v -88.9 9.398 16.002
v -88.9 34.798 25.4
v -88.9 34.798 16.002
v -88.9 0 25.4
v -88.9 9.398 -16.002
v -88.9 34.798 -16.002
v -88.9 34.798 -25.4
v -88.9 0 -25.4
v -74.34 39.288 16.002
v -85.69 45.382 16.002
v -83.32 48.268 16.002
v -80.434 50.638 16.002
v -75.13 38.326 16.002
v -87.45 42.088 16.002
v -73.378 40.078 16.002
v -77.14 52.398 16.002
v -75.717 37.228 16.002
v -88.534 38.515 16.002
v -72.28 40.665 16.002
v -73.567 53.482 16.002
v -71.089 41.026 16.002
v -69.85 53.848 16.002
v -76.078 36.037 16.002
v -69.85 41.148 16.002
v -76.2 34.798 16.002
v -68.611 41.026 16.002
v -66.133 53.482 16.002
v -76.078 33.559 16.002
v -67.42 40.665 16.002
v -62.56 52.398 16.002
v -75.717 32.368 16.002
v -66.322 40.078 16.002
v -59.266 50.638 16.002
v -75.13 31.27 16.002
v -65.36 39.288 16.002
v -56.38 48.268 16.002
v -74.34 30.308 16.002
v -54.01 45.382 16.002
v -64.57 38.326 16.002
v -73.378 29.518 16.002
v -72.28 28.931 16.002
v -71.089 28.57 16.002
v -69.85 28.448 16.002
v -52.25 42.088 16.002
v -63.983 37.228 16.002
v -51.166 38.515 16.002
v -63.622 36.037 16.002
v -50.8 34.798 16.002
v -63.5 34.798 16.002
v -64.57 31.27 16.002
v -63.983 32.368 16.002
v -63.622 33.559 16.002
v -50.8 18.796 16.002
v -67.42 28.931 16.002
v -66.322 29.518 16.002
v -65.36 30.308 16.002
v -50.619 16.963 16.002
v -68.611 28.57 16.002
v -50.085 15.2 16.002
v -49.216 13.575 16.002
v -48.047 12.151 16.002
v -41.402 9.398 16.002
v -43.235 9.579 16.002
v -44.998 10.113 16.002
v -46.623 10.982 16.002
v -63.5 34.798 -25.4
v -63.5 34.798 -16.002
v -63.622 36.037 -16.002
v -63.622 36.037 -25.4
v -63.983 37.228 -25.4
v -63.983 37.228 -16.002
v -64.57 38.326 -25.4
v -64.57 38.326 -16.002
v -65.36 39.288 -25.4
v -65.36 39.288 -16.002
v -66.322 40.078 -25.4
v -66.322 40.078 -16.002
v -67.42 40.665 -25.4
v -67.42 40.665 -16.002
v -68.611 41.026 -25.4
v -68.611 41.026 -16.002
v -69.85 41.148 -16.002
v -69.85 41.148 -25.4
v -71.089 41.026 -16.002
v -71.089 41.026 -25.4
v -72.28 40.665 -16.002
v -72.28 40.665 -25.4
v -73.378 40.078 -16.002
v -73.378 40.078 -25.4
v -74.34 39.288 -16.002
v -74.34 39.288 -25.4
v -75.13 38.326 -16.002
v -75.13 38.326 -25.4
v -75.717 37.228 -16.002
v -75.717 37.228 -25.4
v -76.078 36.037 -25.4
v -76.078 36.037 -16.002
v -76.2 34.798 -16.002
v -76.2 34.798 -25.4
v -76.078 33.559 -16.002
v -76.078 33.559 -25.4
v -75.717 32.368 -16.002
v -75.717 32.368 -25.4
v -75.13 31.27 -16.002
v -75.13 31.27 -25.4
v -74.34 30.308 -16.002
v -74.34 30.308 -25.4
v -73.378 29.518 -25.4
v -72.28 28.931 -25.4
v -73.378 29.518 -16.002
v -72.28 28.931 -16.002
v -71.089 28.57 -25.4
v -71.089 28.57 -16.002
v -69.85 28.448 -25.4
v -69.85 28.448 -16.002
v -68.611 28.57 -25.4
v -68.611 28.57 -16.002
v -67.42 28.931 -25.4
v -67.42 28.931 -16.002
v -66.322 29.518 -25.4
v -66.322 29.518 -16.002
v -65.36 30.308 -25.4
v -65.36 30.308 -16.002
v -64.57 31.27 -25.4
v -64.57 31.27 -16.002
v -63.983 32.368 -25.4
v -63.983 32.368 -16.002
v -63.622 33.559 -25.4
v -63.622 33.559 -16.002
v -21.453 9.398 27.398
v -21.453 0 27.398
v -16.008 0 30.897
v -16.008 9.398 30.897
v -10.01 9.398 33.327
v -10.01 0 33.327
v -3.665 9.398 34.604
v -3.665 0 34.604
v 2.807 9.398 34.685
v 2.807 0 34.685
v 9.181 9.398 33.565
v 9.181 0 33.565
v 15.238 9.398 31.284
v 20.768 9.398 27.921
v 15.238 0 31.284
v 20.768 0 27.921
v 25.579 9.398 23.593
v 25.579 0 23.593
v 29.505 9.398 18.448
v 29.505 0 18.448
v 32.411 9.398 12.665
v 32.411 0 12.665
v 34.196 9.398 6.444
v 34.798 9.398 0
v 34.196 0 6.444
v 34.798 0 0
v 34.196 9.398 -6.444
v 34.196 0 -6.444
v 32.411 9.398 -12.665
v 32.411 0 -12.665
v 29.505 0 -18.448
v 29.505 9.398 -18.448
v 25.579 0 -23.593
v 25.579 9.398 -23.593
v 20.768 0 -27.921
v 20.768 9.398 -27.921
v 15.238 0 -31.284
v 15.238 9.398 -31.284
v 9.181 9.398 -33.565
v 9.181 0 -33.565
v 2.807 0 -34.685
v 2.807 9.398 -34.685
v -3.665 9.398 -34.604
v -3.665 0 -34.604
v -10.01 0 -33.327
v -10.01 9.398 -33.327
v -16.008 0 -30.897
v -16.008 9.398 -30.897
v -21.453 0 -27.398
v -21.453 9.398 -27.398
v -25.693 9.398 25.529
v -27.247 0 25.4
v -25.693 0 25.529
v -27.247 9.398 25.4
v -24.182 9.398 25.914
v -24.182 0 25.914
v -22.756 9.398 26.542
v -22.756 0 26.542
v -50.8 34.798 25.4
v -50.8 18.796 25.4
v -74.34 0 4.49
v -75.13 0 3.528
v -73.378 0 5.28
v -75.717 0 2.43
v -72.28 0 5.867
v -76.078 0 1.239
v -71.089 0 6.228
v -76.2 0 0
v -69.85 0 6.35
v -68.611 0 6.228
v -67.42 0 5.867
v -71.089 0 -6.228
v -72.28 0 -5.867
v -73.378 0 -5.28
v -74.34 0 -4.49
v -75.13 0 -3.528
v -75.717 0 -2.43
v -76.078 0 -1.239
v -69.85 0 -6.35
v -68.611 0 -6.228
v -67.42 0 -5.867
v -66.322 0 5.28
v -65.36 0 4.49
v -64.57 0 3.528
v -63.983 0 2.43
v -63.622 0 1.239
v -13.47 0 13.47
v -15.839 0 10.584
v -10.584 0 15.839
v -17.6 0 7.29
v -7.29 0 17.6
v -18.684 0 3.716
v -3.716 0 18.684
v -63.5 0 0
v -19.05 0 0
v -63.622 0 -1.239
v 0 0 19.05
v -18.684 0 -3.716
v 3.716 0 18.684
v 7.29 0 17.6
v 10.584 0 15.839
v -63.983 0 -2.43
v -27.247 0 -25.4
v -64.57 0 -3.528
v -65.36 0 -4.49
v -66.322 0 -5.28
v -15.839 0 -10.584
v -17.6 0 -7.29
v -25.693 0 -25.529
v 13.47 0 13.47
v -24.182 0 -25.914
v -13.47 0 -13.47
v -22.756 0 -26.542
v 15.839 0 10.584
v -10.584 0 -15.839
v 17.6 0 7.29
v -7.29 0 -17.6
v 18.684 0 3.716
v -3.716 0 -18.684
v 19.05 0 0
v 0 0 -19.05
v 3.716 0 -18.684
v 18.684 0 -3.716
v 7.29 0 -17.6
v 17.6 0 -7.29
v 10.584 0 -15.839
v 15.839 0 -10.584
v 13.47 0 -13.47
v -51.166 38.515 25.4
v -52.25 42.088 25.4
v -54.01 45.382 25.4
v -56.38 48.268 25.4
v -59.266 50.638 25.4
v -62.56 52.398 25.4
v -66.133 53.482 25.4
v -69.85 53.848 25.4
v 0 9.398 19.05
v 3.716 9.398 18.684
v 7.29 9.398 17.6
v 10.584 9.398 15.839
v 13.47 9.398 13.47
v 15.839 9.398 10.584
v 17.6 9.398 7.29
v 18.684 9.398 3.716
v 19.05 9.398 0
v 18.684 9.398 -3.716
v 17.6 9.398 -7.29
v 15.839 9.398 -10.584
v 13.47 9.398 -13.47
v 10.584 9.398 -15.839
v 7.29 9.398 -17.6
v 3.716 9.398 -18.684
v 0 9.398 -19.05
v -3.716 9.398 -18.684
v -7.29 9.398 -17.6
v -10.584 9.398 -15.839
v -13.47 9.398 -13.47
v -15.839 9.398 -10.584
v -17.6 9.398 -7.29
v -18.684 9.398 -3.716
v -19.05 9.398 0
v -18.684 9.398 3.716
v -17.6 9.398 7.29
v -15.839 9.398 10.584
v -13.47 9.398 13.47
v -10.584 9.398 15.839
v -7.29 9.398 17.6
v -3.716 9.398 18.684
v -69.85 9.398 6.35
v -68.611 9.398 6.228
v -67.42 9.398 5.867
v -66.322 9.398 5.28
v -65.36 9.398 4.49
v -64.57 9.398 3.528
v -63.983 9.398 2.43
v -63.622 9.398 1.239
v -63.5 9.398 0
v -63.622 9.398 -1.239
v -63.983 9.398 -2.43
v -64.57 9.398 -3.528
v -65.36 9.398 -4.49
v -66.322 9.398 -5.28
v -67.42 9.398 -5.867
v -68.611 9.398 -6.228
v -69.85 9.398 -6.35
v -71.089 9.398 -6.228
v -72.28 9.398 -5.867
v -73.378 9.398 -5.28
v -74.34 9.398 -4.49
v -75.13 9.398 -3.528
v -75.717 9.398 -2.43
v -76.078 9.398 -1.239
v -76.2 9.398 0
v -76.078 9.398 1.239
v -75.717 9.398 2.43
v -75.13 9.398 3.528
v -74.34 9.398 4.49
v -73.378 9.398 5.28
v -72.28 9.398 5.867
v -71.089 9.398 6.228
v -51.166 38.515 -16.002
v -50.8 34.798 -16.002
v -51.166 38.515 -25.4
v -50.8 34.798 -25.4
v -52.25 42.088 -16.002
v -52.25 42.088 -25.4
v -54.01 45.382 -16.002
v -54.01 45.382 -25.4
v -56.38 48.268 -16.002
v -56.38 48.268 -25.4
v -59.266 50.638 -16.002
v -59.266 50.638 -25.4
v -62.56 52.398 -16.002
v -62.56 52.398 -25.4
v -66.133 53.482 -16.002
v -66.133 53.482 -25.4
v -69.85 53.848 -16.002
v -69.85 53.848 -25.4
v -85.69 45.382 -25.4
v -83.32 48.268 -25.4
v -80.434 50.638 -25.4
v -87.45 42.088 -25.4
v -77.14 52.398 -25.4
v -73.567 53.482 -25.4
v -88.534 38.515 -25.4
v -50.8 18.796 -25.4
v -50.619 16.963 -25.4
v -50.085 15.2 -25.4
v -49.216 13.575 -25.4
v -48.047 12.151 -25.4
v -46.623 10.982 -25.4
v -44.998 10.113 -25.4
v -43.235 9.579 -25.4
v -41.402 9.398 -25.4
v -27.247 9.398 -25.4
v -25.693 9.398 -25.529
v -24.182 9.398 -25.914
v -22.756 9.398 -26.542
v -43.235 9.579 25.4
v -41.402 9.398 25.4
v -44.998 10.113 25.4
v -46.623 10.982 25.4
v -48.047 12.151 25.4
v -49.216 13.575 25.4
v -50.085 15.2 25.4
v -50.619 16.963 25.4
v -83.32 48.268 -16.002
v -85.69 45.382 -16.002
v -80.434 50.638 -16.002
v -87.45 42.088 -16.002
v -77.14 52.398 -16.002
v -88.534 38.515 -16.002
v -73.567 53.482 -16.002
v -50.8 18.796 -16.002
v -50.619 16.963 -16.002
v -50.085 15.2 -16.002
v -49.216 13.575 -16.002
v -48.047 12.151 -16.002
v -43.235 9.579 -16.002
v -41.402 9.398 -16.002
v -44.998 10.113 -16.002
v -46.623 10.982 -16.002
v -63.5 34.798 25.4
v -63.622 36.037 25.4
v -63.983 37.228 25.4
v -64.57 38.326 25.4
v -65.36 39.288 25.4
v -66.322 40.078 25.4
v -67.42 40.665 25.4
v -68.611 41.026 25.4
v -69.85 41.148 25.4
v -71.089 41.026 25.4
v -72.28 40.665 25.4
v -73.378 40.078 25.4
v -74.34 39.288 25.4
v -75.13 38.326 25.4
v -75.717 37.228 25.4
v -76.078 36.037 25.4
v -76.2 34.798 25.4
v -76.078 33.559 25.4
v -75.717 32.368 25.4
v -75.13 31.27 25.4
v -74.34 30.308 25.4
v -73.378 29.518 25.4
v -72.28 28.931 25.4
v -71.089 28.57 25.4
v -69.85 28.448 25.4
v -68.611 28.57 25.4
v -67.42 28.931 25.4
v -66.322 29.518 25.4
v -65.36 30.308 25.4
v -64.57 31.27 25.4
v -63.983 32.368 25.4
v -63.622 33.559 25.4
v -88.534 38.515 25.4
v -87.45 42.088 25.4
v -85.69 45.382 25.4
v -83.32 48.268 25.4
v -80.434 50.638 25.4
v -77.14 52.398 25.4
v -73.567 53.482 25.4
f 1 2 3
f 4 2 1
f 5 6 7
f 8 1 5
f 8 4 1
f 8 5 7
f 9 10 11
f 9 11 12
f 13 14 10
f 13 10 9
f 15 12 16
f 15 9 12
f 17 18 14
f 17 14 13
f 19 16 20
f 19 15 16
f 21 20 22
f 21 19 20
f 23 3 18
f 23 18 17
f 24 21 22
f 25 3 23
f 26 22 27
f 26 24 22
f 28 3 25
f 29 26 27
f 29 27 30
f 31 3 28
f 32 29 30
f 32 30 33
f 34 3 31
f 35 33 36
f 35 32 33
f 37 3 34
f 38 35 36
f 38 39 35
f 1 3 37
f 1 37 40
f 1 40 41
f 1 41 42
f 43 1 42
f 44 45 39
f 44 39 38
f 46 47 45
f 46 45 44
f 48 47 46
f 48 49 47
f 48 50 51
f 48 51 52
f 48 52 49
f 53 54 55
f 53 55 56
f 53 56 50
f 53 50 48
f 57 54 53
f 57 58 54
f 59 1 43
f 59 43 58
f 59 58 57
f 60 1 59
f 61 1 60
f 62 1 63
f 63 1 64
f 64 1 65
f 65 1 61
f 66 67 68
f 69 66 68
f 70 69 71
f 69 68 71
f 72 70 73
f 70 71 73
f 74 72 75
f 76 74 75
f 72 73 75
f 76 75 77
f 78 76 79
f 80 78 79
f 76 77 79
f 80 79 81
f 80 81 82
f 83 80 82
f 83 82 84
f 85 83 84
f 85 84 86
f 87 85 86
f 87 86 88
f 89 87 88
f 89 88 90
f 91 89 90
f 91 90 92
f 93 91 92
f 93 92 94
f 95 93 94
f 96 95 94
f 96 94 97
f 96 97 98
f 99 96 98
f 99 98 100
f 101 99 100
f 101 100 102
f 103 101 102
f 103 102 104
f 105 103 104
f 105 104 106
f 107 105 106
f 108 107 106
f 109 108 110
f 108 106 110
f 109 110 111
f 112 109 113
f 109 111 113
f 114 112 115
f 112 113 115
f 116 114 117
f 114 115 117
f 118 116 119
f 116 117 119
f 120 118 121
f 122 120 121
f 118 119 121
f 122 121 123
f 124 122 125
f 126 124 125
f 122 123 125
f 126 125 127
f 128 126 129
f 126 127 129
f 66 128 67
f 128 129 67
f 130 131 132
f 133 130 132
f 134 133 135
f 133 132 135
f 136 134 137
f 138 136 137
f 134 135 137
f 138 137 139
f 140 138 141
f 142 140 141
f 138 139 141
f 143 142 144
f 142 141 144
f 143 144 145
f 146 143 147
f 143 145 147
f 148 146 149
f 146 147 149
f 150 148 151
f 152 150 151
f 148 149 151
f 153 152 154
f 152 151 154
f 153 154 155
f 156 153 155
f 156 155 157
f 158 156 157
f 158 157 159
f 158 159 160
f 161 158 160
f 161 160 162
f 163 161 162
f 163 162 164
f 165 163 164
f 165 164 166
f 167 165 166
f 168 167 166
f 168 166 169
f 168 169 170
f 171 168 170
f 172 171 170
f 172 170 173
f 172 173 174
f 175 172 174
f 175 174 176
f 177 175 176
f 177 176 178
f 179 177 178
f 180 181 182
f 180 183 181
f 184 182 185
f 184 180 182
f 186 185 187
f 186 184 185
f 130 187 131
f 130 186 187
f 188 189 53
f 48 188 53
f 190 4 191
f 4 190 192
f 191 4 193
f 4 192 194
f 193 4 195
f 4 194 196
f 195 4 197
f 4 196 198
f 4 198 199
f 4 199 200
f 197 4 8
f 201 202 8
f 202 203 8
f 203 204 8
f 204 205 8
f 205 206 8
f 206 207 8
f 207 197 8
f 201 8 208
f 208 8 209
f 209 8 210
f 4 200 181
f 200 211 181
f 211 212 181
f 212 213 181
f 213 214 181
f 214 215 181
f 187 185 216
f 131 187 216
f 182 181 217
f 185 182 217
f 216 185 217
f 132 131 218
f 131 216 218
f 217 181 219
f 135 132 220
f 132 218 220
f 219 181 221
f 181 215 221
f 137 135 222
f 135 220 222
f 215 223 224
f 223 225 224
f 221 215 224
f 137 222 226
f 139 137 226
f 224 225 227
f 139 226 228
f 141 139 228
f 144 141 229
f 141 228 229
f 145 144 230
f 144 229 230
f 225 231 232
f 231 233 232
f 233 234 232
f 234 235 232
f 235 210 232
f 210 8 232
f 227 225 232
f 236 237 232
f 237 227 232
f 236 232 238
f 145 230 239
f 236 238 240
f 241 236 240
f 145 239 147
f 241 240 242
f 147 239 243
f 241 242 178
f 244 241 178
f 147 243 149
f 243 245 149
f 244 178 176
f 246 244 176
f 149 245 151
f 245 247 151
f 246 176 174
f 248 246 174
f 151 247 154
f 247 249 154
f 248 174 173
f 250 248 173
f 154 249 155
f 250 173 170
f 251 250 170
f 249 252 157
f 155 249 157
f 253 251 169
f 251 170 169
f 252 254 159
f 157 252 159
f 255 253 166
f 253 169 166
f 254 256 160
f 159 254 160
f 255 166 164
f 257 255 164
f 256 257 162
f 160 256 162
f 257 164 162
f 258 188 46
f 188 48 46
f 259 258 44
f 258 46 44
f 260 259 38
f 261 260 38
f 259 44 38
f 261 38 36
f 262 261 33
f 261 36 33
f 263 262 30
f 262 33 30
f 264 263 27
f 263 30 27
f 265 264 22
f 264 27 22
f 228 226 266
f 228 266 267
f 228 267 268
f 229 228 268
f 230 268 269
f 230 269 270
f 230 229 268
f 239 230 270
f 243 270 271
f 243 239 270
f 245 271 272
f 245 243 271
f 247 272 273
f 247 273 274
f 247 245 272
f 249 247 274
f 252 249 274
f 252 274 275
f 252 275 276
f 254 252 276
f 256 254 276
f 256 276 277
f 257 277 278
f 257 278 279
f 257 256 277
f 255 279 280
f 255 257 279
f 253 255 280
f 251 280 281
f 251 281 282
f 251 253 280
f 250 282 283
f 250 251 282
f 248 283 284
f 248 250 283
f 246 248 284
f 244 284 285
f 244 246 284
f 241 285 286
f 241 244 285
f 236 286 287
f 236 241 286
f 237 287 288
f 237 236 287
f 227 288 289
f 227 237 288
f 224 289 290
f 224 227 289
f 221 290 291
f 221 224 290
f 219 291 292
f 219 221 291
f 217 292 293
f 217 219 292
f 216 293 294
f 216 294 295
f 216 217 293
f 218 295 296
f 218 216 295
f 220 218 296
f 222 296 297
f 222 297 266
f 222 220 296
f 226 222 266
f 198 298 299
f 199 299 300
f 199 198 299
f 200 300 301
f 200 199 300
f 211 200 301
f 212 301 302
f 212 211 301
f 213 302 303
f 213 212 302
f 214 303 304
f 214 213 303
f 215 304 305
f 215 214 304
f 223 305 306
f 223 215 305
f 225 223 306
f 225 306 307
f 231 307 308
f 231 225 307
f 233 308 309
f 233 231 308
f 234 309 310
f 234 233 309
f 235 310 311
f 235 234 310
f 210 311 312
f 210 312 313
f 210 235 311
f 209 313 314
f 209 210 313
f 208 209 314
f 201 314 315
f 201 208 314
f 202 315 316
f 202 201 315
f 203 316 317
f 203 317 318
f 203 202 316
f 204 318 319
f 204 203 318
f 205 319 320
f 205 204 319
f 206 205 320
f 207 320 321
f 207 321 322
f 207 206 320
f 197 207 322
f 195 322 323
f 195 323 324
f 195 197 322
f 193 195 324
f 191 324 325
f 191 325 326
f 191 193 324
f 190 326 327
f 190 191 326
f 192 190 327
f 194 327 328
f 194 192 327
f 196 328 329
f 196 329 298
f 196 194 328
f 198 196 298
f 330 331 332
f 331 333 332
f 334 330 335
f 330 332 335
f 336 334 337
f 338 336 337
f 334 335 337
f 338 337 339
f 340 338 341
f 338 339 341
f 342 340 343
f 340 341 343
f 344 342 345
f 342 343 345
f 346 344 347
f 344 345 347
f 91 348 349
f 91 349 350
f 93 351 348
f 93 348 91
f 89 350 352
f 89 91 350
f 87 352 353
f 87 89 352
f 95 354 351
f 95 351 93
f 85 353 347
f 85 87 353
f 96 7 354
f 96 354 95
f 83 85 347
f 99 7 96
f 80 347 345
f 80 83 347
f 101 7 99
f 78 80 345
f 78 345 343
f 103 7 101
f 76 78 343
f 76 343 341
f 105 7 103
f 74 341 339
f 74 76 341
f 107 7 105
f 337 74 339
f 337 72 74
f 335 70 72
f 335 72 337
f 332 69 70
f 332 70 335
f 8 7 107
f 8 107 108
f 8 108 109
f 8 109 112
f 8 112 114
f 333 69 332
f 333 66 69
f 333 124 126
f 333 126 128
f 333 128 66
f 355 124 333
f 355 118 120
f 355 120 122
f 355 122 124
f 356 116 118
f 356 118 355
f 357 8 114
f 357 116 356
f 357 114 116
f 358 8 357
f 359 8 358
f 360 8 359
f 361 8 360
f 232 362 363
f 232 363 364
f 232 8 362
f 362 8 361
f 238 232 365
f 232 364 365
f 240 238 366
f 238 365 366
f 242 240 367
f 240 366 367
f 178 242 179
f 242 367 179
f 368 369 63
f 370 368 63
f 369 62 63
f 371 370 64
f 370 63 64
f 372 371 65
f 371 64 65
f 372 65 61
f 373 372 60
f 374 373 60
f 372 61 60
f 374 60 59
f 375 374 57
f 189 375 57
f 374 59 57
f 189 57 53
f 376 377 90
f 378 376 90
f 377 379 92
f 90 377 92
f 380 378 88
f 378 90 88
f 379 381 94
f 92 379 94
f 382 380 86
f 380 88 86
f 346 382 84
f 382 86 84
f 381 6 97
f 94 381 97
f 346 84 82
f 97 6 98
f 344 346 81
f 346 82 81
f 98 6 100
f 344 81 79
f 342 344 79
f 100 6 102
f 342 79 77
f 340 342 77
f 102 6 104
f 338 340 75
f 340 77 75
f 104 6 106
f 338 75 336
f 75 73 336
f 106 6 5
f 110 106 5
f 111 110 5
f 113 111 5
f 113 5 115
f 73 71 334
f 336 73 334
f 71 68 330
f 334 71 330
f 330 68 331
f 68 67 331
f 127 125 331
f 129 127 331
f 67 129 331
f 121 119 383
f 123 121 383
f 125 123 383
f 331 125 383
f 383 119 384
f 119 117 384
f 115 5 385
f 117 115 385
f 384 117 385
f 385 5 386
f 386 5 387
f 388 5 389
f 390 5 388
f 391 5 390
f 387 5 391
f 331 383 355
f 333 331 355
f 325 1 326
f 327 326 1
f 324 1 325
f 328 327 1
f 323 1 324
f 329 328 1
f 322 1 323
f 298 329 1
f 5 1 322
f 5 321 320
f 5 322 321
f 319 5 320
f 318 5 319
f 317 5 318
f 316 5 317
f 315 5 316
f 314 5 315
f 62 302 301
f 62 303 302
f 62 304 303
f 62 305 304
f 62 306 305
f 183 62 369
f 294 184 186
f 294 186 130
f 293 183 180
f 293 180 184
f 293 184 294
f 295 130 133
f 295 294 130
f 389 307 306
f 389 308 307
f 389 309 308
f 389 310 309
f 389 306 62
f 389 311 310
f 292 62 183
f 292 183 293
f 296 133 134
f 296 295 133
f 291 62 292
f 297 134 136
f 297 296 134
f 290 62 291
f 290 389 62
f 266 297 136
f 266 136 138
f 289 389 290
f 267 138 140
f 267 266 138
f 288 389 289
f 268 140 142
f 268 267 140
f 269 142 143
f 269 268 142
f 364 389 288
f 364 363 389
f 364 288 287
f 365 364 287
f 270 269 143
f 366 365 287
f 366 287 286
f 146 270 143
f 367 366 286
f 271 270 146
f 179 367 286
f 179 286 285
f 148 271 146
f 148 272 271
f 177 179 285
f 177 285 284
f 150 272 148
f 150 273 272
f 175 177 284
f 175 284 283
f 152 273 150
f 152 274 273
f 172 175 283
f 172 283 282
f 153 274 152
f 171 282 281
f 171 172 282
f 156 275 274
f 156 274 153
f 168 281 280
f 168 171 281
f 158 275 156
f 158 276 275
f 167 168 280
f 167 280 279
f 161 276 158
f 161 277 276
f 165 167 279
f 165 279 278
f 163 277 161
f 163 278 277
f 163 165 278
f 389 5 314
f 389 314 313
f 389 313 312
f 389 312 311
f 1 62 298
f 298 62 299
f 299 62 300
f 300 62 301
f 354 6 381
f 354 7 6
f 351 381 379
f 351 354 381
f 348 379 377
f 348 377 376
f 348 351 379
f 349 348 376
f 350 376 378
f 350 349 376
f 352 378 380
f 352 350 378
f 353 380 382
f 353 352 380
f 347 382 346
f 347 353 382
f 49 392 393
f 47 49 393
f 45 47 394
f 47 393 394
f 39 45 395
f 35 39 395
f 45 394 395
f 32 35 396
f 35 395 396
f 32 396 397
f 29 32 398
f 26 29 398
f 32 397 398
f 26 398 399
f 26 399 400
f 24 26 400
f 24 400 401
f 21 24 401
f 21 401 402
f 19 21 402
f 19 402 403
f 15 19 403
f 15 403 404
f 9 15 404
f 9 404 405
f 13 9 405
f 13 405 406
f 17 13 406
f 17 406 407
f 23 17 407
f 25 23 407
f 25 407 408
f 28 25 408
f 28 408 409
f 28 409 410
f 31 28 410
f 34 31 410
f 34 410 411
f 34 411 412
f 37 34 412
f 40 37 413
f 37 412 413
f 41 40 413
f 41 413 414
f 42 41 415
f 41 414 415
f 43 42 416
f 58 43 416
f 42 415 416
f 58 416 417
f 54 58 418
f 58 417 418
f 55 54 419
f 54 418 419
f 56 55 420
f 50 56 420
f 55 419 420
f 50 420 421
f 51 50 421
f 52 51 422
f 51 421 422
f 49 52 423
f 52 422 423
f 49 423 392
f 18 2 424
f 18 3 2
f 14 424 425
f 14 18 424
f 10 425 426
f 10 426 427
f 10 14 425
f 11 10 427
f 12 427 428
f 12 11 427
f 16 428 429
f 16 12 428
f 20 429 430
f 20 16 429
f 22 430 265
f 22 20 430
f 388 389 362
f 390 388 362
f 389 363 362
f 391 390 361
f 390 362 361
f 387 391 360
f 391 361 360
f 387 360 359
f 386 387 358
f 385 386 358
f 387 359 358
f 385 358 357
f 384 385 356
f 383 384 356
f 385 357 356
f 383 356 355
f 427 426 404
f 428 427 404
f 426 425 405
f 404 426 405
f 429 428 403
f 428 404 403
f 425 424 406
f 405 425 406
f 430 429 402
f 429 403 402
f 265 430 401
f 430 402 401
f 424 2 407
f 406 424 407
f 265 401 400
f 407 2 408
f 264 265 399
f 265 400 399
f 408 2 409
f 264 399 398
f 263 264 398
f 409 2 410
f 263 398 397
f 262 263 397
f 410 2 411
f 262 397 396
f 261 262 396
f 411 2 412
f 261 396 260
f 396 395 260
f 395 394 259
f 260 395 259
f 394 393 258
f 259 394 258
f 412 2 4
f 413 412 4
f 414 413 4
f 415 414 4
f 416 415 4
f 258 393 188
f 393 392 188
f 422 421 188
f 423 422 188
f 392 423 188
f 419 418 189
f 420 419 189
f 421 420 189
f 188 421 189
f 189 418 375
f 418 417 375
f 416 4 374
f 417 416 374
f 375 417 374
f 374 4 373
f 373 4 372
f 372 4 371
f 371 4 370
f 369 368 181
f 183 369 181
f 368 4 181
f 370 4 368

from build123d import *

# Parameters (mm, degrees)
SKETCH1_R           = 19.05
SKETCH1_R_2         = 6.35
BOSS_EXTRUDE1_DEPTH = 9.398
SKETCH4_W           = 38.1
SKETCH4_H           = 9.398
BOSS_EXTRUDE3_DEPTH = 44.45
FILLET1_R           = 19.05
FILLET2_R           = 9.398
CUT_EXTRUDE1_REACH  = 122.111
SKETCH6_R           = 6.35


with BuildPart() as part:
    # Sketch1 → Boss-Extrude1 (new body)
    with BuildSketch(Plane(origin=(0, 0, 0), x_dir=(1, 0, 0), z_dir=(0, 1, 0))):
        with BuildLine():
            Line((-23.785306473, 25.4), (-88.9, 25.4))
            Line((-88.9, 25.4), (-88.9, -25.4))
            Line((-88.9, -25.4), (-23.785306473, -25.4))
            ThreePointArc((-23.785306473, -25.4), (34.798, 0), (-23.785306473, 25.4))
        make_face()
        with Locations(Location((0, 0, 0), (0, 0, 270))):
            Circle(SKETCH1_R, mode=Mode.SUBTRACT)
        with Locations(Location((-69.85, 0, 0), (0, 0, 270))):
            Circle(SKETCH1_R_2, mode=Mode.SUBTRACT)
    extrude(amount=BOSS_EXTRUDE1_DEPTH)

    # Sketch4 → Boss-Extrude3 (add)
    with BuildSketch(Plane(origin=(0, 9.398, 0), x_dir=(1, 0, 0), z_dir=(0, 1, 0))):
        with Locations((-69.85, 20.701)):
            Rectangle(SKETCH4_W, SKETCH4_H)
        with Locations((-69.85, -20.701)):
            Rectangle(SKETCH4_W, SKETCH4_H)
    extrude(amount=BOSS_EXTRUDE3_DEPTH)

    # Fillet1
    fillet1_edges = [part.edges().sort_by_distance(p)[0] for p in [
        (-88.9, 53.848, 20.701),
        (-88.9, 53.848, -20.701),
        (-50.8, 53.848, -20.701),
        (-50.8, 53.848, 20.701),
    ]]
    fillet(fillet1_edges, radius=FILLET1_R - 0.0001)  # a hair under: the kernel refuses the full size

    # Fillet2
    fillet2_edges = [part.edges().sort_by_distance(p)[0] for p in [
        (-23.785306473, 4.699, 25.4),
        (-23.785306473, 4.699, -25.4),
        (-50.8, 9.398, -20.701),
        (-50.8, 9.398, 20.701),
    ]]
    fillet(fillet2_edges, radius=FILLET2_R)

    # Cut-Extrude1: up to this face of the body (flat: up to its plane)
    cut_extrude1_end = Plane(part.part.faces().sort_by_distance((-66.468021602, 22.831221423, -25.4))[0])
    # Sketch6 → Cut-Extrude1 (cut, up to the picked face)
    with BuildSketch(Plane.XY.offset(25.4), mode=Mode.PRIVATE) as cut_extrude1_sk1:
        with Locations((-69.85, 34.798)):
            Circle(SKETCH6_R)
    cut_extrude1_tool1 = split(extrude(cut_extrude1_sk1.sketch, amount=-CUT_EXTRUDE1_REACH, mode=Mode.PRIVATE), bisect_by=cut_extrude1_end, keep=Keep.BOTH, mode=Mode.PRIVATE)
    add(cut_extrude1_tool1.solids().sort_by(Axis((-69.85, 34.798, 25.4), (0, 0, -1)))[0], mode=Mode.SUBTRACT)


solid = part.part
